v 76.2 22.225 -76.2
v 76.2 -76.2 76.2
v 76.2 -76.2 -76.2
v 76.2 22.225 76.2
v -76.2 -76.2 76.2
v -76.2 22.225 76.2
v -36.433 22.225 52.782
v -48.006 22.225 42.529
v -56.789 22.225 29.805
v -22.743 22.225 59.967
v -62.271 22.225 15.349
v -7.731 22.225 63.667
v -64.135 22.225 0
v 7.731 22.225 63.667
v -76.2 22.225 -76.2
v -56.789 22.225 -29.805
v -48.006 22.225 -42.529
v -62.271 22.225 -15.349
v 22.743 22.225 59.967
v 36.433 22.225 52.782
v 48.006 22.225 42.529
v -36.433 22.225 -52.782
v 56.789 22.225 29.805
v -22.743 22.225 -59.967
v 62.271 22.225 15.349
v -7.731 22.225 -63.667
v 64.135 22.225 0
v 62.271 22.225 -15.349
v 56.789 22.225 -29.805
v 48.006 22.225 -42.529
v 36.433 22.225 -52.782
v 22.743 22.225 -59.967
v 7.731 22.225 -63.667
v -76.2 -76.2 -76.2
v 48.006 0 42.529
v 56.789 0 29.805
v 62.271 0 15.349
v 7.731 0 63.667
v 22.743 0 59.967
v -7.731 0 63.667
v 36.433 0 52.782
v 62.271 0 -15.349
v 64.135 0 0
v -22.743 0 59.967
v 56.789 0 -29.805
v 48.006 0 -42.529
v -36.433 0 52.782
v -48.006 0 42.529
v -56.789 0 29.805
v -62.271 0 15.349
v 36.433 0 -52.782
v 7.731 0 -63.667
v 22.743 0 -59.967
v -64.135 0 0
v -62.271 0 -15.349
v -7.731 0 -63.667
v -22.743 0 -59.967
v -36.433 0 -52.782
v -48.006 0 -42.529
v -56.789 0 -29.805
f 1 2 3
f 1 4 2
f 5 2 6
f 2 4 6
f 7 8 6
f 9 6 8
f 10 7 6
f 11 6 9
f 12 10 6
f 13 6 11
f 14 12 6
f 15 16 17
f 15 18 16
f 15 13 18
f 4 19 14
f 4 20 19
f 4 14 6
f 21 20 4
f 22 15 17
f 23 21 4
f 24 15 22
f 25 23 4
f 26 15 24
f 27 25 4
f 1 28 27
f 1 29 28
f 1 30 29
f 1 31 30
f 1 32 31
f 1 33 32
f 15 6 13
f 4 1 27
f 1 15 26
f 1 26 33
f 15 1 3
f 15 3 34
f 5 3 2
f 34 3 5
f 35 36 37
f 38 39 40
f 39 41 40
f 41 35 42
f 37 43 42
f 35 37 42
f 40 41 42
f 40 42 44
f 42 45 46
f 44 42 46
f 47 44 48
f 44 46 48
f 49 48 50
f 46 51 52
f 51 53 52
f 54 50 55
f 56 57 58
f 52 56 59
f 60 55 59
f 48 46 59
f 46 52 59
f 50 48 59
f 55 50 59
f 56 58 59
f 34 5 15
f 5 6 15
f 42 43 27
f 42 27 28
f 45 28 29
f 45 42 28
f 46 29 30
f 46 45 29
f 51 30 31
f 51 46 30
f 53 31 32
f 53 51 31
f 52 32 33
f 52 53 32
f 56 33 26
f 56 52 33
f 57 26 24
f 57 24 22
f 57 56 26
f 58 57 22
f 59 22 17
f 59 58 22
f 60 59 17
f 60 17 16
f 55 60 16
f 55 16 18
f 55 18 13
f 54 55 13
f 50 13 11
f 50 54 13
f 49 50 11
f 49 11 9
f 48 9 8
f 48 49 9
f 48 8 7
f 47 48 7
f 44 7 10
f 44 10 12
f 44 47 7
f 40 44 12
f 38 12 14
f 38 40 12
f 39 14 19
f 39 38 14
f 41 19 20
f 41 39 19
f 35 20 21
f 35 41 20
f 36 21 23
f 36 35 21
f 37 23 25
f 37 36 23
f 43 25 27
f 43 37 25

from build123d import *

# Parameters (mm, degrees)
SKETCH1_W           = 152.4
SKETCH1_H           = 152.4
SKETCH1_R           = 64.135
BOSS_EXTRUDE1_DEPTH = 22.225
SKETCH2_W           = 152.4
SKETCH2_H           = 152.4
BOSS_EXTRUDE2_DEPTH = 76.2


with BuildPart() as part:
    # Sketch1 → Boss-Extrude1 (new body)
    with BuildSketch(Plane(origin=(0, 0, 0), x_dir=(1, 0, 0), z_dir=(0, 1, 0))):
        Rectangle(SKETCH1_W, SKETCH1_H)
        Circle(SKETCH1_R, mode=Mode.SUBTRACT)
    extrude(amount=BOSS_EXTRUDE1_DEPTH)

    # Sketch2 → Boss-Extrude2 (add)
    with BuildSketch(Plane(origin=(0, 0, 0), x_dir=(-1, 0, 0), z_dir=(0, -1, 0))):
        Rectangle(SKETCH2_W, SKETCH2_H)
    extrude(amount=BOSS_EXTRUDE2_DEPTH)


solid = part.part
